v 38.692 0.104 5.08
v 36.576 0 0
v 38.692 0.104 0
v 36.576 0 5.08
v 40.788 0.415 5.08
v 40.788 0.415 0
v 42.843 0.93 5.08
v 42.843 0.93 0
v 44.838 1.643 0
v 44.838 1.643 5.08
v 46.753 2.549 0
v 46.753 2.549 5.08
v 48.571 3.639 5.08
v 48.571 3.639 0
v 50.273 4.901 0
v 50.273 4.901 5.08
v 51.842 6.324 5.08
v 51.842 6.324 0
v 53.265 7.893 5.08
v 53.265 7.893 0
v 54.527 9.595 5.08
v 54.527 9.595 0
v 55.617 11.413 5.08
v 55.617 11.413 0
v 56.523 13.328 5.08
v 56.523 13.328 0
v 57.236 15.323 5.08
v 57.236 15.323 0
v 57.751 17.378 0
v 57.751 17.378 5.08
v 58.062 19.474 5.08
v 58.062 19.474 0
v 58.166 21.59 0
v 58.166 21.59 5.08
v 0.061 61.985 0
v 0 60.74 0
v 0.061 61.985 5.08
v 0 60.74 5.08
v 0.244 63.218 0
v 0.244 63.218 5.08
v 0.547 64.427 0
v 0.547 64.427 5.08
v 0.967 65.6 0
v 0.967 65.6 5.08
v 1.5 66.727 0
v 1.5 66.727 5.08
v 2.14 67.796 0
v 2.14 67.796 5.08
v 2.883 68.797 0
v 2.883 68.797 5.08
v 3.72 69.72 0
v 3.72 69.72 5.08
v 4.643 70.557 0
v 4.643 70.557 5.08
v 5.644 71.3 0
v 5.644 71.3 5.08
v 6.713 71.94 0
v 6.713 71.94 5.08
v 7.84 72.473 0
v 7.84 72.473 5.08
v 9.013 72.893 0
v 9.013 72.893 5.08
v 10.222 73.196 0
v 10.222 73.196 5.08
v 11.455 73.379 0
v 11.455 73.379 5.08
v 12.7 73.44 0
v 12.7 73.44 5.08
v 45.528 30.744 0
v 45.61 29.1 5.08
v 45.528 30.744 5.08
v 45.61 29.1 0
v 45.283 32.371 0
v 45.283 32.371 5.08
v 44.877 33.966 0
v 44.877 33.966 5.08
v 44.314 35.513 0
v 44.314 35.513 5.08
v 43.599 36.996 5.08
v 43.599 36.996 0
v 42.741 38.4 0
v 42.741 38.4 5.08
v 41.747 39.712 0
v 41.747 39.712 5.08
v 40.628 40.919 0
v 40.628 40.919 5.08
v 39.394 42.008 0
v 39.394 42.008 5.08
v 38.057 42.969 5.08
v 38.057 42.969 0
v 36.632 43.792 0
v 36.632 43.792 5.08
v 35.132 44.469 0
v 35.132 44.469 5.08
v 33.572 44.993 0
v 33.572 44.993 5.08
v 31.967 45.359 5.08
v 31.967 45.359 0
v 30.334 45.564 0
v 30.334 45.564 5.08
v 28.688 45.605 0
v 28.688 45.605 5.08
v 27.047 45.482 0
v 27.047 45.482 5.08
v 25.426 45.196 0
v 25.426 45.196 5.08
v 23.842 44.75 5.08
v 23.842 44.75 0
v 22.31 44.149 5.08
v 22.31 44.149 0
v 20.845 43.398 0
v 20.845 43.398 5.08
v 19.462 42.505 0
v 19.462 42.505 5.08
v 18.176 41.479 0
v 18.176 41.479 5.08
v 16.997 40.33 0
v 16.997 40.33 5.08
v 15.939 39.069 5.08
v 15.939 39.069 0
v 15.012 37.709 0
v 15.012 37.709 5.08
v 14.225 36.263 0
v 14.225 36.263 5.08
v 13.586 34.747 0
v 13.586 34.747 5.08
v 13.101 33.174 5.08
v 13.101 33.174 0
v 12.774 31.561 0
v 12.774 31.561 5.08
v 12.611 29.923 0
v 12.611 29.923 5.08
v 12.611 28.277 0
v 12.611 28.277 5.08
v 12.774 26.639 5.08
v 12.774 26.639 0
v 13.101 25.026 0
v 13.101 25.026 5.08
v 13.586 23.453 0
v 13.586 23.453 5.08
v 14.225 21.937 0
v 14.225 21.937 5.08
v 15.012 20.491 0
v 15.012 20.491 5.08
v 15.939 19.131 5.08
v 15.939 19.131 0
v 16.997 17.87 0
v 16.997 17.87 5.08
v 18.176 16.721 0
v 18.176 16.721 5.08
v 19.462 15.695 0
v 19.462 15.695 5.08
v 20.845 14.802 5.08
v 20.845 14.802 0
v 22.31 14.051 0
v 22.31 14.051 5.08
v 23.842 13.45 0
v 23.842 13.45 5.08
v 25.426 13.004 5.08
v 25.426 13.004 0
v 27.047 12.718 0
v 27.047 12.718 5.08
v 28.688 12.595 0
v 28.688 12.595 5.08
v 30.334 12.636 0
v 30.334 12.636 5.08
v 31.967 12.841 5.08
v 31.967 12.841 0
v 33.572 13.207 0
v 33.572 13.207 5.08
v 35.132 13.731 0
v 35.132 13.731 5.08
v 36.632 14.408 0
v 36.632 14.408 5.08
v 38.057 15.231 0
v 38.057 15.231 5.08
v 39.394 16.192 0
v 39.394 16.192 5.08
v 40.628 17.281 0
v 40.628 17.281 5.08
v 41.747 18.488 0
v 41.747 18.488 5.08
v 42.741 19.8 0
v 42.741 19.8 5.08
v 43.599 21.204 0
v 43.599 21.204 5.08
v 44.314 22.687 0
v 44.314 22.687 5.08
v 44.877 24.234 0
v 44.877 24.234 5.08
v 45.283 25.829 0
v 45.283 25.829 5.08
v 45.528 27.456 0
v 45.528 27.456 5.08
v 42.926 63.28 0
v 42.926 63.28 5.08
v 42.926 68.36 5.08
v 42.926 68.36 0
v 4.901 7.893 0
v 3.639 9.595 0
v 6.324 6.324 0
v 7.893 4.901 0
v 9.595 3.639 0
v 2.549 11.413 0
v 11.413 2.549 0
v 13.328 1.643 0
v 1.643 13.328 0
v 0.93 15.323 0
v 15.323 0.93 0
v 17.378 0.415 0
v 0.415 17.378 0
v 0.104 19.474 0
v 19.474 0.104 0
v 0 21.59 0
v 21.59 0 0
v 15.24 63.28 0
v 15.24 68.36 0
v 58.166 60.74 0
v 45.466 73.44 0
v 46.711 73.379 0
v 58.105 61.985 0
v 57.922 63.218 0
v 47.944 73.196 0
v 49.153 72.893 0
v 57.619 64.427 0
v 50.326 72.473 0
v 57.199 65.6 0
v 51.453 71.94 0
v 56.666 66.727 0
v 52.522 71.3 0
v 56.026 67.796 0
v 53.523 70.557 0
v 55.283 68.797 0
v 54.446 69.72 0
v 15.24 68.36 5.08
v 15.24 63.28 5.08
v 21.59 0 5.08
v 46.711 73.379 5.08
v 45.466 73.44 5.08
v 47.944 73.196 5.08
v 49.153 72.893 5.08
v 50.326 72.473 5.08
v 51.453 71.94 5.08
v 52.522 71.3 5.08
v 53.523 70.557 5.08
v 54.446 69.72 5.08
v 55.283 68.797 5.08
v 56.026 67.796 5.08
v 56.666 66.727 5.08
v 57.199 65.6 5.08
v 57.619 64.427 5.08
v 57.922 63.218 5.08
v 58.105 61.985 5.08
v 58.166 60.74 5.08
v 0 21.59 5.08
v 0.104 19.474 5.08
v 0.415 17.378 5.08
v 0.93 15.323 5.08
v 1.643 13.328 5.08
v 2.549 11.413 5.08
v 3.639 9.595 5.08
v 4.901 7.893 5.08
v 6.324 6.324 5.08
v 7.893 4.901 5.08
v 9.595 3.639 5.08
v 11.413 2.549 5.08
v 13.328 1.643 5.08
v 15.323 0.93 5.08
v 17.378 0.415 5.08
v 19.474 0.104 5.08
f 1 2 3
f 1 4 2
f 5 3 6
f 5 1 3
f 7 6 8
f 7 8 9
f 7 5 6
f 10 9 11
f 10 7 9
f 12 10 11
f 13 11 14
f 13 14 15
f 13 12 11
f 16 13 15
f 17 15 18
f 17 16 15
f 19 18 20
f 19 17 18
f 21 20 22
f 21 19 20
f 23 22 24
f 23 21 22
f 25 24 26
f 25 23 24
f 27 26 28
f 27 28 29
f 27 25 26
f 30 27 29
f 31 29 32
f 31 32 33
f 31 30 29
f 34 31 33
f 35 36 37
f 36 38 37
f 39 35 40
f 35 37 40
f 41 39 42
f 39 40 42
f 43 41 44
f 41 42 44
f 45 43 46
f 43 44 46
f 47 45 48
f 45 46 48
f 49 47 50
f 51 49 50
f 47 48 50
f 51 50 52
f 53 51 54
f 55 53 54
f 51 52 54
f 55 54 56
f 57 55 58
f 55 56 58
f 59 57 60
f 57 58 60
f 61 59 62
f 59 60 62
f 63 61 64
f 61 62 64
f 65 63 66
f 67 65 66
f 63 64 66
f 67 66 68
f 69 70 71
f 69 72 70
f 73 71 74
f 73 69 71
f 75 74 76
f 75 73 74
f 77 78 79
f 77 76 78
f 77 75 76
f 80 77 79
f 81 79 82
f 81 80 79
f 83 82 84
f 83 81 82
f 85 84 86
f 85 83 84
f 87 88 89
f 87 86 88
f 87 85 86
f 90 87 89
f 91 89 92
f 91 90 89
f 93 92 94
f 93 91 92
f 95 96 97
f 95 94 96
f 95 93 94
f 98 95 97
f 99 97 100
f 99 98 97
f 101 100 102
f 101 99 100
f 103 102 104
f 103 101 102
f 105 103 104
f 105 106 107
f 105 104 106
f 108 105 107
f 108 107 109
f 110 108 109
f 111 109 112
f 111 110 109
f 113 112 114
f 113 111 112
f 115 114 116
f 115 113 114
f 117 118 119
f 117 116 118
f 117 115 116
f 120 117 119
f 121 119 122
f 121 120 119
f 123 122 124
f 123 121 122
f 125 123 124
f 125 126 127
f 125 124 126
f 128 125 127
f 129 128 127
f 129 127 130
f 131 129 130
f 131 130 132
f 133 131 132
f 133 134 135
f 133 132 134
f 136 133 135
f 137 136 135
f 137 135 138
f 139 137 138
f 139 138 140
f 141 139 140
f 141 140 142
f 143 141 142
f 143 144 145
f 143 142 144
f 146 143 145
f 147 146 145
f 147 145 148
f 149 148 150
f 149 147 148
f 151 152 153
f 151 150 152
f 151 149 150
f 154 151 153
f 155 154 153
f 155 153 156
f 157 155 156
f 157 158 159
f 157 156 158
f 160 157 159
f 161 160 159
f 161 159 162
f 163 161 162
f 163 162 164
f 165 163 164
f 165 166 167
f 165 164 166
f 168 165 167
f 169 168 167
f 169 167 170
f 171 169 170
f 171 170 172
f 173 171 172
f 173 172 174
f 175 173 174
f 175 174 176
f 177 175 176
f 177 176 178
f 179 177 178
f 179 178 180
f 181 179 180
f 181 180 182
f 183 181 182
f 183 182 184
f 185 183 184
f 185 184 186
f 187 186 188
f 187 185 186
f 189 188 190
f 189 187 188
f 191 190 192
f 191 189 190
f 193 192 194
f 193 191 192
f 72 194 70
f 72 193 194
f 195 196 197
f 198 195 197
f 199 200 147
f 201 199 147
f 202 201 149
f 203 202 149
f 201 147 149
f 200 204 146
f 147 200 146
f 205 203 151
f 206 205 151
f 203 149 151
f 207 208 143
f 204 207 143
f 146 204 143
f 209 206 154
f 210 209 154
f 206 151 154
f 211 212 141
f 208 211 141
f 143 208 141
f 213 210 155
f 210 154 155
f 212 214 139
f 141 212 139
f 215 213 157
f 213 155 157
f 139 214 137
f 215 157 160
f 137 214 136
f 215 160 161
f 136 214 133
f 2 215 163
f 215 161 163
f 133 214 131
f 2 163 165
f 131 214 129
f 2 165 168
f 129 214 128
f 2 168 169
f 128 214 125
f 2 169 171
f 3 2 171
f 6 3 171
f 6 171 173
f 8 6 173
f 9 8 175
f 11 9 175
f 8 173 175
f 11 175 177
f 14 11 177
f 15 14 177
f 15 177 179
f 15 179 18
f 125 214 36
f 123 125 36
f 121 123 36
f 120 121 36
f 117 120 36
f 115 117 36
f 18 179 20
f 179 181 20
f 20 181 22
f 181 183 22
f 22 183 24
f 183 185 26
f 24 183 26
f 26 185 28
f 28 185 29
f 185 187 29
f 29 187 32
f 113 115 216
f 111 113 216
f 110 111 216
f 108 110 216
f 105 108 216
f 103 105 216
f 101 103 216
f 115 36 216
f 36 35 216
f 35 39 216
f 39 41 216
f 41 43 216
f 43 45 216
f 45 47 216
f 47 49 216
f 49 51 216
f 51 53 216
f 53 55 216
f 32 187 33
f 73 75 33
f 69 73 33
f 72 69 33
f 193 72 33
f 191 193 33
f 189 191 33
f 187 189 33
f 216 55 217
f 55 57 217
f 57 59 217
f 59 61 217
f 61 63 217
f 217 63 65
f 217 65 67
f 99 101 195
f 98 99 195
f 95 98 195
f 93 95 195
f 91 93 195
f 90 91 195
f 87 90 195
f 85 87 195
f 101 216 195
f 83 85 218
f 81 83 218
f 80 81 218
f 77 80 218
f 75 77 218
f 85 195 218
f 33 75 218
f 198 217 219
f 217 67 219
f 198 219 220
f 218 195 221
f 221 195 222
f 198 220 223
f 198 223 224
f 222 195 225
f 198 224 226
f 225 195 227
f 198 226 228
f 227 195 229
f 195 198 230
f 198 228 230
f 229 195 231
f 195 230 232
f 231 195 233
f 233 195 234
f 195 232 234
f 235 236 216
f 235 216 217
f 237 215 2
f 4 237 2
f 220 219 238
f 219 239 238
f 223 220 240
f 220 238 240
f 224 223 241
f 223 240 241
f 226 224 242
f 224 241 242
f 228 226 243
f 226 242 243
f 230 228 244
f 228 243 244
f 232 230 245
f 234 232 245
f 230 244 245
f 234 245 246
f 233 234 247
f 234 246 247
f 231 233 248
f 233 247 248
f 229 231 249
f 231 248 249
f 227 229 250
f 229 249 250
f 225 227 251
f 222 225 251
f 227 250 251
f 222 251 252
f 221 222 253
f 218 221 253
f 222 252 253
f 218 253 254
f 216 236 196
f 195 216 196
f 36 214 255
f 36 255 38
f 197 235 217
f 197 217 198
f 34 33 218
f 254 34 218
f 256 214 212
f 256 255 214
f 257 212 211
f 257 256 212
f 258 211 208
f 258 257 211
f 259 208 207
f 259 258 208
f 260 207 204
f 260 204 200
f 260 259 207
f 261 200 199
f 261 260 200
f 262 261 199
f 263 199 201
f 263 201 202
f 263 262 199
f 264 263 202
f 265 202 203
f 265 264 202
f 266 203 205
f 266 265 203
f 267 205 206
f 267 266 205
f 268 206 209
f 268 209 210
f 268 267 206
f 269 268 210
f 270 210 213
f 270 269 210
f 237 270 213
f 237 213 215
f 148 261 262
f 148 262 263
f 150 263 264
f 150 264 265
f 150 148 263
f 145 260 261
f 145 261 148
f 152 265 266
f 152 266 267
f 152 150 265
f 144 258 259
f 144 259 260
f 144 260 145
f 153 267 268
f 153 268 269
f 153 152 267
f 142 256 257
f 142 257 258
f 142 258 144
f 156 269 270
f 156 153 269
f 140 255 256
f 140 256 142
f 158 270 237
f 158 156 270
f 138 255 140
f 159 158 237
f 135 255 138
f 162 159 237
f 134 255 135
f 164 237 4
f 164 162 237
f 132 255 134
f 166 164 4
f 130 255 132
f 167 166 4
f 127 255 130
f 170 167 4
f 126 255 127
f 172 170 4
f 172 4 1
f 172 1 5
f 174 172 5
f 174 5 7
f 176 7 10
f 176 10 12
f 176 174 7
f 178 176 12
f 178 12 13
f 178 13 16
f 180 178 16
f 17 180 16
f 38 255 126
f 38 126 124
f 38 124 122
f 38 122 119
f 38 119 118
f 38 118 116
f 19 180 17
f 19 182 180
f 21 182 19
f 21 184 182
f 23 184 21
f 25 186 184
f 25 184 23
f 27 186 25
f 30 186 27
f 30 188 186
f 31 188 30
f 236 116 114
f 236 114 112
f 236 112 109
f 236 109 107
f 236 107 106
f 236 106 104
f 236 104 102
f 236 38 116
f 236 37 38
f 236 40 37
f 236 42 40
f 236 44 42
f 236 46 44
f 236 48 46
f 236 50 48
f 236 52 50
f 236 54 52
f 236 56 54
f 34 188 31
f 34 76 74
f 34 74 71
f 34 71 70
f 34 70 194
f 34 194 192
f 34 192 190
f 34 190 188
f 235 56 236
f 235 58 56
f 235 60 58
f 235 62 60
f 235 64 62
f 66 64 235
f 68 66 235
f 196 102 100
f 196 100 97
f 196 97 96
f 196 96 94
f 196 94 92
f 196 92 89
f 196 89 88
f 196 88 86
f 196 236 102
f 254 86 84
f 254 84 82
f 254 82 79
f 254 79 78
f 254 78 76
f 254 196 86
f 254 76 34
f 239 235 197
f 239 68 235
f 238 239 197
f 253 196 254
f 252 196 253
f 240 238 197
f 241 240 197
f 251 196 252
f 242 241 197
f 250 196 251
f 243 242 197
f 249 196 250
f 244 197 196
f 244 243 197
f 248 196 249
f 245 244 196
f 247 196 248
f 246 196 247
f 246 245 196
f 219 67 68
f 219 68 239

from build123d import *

# Parameters (mm, degrees)
SKETCH1_W               = 58.166
SKETCH1_H               = 73.439999932
BOSS_EXTRUDE1_DEPTH     = 5.08
SKETCH2_W               = 27.686
SKETCH2_H               = 5.08
CUT_EXTRUDE1_DEPTH      = 94.821764778
CUT_EXTRUDE2_DEPTH      = 94.821764778
CUT_EXTRUDE2_DEPTH_BACK = 94.821764778
SKETCH7_R               = 16.51
FILLET2_R               = 21.59
FILLET3_R               = 12.7


with BuildPart() as part:
    # Sketch1 → Boss-Extrude1 (new body)
    with BuildSketch(Plane.XY):
        with Locations((29.083, 36.719999966)):
            Rectangle(SKETCH1_W, SKETCH1_H)
    extrude(amount=BOSS_EXTRUDE1_DEPTH)

    # Sketch2 → Cut-Extrude1 (cut, through all)
    with BuildSketch(Plane.XY.offset(5.08)):
        with Locations((29.083, 65.819999932)):
            Rectangle(SKETCH2_W, SKETCH2_H)
    extrude(amount=-CUT_EXTRUDE1_DEPTH, mode=Mode.SUBTRACT)

    # Sketch7 → Cut-Extrude2 (cut, two sides: drawn at the far end of the back side and taken through both)
    with BuildSketch(Plane.XY.offset(5.08).offset(-CUT_EXTRUDE2_DEPTH_BACK)):
        with Locations((29.099999966, 29.1)):
            Circle(SKETCH7_R)
    extrude(amount=CUT_EXTRUDE2_DEPTH + CUT_EXTRUDE2_DEPTH_BACK, mode=Mode.SUBTRACT)

    # Fillet2
    fillet2_edges = [part.edges().sort_by_distance(p)[0] for p in [
        (58.166, 0, 2.54),
        (0, 0, 2.54),
    ]]
    fillet(fillet2_edges, radius=FILLET2_R)

    # Fillet3
    fillet3_edges = [part.edges().sort_by_distance(p)[0] for p in [
        (0, 73.439999932, 2.54),
        (58.166, 73.439999932, 2.54),
    ]]
    fillet(fillet3_edges, radius=FILLET3_R)


solid = part.part
